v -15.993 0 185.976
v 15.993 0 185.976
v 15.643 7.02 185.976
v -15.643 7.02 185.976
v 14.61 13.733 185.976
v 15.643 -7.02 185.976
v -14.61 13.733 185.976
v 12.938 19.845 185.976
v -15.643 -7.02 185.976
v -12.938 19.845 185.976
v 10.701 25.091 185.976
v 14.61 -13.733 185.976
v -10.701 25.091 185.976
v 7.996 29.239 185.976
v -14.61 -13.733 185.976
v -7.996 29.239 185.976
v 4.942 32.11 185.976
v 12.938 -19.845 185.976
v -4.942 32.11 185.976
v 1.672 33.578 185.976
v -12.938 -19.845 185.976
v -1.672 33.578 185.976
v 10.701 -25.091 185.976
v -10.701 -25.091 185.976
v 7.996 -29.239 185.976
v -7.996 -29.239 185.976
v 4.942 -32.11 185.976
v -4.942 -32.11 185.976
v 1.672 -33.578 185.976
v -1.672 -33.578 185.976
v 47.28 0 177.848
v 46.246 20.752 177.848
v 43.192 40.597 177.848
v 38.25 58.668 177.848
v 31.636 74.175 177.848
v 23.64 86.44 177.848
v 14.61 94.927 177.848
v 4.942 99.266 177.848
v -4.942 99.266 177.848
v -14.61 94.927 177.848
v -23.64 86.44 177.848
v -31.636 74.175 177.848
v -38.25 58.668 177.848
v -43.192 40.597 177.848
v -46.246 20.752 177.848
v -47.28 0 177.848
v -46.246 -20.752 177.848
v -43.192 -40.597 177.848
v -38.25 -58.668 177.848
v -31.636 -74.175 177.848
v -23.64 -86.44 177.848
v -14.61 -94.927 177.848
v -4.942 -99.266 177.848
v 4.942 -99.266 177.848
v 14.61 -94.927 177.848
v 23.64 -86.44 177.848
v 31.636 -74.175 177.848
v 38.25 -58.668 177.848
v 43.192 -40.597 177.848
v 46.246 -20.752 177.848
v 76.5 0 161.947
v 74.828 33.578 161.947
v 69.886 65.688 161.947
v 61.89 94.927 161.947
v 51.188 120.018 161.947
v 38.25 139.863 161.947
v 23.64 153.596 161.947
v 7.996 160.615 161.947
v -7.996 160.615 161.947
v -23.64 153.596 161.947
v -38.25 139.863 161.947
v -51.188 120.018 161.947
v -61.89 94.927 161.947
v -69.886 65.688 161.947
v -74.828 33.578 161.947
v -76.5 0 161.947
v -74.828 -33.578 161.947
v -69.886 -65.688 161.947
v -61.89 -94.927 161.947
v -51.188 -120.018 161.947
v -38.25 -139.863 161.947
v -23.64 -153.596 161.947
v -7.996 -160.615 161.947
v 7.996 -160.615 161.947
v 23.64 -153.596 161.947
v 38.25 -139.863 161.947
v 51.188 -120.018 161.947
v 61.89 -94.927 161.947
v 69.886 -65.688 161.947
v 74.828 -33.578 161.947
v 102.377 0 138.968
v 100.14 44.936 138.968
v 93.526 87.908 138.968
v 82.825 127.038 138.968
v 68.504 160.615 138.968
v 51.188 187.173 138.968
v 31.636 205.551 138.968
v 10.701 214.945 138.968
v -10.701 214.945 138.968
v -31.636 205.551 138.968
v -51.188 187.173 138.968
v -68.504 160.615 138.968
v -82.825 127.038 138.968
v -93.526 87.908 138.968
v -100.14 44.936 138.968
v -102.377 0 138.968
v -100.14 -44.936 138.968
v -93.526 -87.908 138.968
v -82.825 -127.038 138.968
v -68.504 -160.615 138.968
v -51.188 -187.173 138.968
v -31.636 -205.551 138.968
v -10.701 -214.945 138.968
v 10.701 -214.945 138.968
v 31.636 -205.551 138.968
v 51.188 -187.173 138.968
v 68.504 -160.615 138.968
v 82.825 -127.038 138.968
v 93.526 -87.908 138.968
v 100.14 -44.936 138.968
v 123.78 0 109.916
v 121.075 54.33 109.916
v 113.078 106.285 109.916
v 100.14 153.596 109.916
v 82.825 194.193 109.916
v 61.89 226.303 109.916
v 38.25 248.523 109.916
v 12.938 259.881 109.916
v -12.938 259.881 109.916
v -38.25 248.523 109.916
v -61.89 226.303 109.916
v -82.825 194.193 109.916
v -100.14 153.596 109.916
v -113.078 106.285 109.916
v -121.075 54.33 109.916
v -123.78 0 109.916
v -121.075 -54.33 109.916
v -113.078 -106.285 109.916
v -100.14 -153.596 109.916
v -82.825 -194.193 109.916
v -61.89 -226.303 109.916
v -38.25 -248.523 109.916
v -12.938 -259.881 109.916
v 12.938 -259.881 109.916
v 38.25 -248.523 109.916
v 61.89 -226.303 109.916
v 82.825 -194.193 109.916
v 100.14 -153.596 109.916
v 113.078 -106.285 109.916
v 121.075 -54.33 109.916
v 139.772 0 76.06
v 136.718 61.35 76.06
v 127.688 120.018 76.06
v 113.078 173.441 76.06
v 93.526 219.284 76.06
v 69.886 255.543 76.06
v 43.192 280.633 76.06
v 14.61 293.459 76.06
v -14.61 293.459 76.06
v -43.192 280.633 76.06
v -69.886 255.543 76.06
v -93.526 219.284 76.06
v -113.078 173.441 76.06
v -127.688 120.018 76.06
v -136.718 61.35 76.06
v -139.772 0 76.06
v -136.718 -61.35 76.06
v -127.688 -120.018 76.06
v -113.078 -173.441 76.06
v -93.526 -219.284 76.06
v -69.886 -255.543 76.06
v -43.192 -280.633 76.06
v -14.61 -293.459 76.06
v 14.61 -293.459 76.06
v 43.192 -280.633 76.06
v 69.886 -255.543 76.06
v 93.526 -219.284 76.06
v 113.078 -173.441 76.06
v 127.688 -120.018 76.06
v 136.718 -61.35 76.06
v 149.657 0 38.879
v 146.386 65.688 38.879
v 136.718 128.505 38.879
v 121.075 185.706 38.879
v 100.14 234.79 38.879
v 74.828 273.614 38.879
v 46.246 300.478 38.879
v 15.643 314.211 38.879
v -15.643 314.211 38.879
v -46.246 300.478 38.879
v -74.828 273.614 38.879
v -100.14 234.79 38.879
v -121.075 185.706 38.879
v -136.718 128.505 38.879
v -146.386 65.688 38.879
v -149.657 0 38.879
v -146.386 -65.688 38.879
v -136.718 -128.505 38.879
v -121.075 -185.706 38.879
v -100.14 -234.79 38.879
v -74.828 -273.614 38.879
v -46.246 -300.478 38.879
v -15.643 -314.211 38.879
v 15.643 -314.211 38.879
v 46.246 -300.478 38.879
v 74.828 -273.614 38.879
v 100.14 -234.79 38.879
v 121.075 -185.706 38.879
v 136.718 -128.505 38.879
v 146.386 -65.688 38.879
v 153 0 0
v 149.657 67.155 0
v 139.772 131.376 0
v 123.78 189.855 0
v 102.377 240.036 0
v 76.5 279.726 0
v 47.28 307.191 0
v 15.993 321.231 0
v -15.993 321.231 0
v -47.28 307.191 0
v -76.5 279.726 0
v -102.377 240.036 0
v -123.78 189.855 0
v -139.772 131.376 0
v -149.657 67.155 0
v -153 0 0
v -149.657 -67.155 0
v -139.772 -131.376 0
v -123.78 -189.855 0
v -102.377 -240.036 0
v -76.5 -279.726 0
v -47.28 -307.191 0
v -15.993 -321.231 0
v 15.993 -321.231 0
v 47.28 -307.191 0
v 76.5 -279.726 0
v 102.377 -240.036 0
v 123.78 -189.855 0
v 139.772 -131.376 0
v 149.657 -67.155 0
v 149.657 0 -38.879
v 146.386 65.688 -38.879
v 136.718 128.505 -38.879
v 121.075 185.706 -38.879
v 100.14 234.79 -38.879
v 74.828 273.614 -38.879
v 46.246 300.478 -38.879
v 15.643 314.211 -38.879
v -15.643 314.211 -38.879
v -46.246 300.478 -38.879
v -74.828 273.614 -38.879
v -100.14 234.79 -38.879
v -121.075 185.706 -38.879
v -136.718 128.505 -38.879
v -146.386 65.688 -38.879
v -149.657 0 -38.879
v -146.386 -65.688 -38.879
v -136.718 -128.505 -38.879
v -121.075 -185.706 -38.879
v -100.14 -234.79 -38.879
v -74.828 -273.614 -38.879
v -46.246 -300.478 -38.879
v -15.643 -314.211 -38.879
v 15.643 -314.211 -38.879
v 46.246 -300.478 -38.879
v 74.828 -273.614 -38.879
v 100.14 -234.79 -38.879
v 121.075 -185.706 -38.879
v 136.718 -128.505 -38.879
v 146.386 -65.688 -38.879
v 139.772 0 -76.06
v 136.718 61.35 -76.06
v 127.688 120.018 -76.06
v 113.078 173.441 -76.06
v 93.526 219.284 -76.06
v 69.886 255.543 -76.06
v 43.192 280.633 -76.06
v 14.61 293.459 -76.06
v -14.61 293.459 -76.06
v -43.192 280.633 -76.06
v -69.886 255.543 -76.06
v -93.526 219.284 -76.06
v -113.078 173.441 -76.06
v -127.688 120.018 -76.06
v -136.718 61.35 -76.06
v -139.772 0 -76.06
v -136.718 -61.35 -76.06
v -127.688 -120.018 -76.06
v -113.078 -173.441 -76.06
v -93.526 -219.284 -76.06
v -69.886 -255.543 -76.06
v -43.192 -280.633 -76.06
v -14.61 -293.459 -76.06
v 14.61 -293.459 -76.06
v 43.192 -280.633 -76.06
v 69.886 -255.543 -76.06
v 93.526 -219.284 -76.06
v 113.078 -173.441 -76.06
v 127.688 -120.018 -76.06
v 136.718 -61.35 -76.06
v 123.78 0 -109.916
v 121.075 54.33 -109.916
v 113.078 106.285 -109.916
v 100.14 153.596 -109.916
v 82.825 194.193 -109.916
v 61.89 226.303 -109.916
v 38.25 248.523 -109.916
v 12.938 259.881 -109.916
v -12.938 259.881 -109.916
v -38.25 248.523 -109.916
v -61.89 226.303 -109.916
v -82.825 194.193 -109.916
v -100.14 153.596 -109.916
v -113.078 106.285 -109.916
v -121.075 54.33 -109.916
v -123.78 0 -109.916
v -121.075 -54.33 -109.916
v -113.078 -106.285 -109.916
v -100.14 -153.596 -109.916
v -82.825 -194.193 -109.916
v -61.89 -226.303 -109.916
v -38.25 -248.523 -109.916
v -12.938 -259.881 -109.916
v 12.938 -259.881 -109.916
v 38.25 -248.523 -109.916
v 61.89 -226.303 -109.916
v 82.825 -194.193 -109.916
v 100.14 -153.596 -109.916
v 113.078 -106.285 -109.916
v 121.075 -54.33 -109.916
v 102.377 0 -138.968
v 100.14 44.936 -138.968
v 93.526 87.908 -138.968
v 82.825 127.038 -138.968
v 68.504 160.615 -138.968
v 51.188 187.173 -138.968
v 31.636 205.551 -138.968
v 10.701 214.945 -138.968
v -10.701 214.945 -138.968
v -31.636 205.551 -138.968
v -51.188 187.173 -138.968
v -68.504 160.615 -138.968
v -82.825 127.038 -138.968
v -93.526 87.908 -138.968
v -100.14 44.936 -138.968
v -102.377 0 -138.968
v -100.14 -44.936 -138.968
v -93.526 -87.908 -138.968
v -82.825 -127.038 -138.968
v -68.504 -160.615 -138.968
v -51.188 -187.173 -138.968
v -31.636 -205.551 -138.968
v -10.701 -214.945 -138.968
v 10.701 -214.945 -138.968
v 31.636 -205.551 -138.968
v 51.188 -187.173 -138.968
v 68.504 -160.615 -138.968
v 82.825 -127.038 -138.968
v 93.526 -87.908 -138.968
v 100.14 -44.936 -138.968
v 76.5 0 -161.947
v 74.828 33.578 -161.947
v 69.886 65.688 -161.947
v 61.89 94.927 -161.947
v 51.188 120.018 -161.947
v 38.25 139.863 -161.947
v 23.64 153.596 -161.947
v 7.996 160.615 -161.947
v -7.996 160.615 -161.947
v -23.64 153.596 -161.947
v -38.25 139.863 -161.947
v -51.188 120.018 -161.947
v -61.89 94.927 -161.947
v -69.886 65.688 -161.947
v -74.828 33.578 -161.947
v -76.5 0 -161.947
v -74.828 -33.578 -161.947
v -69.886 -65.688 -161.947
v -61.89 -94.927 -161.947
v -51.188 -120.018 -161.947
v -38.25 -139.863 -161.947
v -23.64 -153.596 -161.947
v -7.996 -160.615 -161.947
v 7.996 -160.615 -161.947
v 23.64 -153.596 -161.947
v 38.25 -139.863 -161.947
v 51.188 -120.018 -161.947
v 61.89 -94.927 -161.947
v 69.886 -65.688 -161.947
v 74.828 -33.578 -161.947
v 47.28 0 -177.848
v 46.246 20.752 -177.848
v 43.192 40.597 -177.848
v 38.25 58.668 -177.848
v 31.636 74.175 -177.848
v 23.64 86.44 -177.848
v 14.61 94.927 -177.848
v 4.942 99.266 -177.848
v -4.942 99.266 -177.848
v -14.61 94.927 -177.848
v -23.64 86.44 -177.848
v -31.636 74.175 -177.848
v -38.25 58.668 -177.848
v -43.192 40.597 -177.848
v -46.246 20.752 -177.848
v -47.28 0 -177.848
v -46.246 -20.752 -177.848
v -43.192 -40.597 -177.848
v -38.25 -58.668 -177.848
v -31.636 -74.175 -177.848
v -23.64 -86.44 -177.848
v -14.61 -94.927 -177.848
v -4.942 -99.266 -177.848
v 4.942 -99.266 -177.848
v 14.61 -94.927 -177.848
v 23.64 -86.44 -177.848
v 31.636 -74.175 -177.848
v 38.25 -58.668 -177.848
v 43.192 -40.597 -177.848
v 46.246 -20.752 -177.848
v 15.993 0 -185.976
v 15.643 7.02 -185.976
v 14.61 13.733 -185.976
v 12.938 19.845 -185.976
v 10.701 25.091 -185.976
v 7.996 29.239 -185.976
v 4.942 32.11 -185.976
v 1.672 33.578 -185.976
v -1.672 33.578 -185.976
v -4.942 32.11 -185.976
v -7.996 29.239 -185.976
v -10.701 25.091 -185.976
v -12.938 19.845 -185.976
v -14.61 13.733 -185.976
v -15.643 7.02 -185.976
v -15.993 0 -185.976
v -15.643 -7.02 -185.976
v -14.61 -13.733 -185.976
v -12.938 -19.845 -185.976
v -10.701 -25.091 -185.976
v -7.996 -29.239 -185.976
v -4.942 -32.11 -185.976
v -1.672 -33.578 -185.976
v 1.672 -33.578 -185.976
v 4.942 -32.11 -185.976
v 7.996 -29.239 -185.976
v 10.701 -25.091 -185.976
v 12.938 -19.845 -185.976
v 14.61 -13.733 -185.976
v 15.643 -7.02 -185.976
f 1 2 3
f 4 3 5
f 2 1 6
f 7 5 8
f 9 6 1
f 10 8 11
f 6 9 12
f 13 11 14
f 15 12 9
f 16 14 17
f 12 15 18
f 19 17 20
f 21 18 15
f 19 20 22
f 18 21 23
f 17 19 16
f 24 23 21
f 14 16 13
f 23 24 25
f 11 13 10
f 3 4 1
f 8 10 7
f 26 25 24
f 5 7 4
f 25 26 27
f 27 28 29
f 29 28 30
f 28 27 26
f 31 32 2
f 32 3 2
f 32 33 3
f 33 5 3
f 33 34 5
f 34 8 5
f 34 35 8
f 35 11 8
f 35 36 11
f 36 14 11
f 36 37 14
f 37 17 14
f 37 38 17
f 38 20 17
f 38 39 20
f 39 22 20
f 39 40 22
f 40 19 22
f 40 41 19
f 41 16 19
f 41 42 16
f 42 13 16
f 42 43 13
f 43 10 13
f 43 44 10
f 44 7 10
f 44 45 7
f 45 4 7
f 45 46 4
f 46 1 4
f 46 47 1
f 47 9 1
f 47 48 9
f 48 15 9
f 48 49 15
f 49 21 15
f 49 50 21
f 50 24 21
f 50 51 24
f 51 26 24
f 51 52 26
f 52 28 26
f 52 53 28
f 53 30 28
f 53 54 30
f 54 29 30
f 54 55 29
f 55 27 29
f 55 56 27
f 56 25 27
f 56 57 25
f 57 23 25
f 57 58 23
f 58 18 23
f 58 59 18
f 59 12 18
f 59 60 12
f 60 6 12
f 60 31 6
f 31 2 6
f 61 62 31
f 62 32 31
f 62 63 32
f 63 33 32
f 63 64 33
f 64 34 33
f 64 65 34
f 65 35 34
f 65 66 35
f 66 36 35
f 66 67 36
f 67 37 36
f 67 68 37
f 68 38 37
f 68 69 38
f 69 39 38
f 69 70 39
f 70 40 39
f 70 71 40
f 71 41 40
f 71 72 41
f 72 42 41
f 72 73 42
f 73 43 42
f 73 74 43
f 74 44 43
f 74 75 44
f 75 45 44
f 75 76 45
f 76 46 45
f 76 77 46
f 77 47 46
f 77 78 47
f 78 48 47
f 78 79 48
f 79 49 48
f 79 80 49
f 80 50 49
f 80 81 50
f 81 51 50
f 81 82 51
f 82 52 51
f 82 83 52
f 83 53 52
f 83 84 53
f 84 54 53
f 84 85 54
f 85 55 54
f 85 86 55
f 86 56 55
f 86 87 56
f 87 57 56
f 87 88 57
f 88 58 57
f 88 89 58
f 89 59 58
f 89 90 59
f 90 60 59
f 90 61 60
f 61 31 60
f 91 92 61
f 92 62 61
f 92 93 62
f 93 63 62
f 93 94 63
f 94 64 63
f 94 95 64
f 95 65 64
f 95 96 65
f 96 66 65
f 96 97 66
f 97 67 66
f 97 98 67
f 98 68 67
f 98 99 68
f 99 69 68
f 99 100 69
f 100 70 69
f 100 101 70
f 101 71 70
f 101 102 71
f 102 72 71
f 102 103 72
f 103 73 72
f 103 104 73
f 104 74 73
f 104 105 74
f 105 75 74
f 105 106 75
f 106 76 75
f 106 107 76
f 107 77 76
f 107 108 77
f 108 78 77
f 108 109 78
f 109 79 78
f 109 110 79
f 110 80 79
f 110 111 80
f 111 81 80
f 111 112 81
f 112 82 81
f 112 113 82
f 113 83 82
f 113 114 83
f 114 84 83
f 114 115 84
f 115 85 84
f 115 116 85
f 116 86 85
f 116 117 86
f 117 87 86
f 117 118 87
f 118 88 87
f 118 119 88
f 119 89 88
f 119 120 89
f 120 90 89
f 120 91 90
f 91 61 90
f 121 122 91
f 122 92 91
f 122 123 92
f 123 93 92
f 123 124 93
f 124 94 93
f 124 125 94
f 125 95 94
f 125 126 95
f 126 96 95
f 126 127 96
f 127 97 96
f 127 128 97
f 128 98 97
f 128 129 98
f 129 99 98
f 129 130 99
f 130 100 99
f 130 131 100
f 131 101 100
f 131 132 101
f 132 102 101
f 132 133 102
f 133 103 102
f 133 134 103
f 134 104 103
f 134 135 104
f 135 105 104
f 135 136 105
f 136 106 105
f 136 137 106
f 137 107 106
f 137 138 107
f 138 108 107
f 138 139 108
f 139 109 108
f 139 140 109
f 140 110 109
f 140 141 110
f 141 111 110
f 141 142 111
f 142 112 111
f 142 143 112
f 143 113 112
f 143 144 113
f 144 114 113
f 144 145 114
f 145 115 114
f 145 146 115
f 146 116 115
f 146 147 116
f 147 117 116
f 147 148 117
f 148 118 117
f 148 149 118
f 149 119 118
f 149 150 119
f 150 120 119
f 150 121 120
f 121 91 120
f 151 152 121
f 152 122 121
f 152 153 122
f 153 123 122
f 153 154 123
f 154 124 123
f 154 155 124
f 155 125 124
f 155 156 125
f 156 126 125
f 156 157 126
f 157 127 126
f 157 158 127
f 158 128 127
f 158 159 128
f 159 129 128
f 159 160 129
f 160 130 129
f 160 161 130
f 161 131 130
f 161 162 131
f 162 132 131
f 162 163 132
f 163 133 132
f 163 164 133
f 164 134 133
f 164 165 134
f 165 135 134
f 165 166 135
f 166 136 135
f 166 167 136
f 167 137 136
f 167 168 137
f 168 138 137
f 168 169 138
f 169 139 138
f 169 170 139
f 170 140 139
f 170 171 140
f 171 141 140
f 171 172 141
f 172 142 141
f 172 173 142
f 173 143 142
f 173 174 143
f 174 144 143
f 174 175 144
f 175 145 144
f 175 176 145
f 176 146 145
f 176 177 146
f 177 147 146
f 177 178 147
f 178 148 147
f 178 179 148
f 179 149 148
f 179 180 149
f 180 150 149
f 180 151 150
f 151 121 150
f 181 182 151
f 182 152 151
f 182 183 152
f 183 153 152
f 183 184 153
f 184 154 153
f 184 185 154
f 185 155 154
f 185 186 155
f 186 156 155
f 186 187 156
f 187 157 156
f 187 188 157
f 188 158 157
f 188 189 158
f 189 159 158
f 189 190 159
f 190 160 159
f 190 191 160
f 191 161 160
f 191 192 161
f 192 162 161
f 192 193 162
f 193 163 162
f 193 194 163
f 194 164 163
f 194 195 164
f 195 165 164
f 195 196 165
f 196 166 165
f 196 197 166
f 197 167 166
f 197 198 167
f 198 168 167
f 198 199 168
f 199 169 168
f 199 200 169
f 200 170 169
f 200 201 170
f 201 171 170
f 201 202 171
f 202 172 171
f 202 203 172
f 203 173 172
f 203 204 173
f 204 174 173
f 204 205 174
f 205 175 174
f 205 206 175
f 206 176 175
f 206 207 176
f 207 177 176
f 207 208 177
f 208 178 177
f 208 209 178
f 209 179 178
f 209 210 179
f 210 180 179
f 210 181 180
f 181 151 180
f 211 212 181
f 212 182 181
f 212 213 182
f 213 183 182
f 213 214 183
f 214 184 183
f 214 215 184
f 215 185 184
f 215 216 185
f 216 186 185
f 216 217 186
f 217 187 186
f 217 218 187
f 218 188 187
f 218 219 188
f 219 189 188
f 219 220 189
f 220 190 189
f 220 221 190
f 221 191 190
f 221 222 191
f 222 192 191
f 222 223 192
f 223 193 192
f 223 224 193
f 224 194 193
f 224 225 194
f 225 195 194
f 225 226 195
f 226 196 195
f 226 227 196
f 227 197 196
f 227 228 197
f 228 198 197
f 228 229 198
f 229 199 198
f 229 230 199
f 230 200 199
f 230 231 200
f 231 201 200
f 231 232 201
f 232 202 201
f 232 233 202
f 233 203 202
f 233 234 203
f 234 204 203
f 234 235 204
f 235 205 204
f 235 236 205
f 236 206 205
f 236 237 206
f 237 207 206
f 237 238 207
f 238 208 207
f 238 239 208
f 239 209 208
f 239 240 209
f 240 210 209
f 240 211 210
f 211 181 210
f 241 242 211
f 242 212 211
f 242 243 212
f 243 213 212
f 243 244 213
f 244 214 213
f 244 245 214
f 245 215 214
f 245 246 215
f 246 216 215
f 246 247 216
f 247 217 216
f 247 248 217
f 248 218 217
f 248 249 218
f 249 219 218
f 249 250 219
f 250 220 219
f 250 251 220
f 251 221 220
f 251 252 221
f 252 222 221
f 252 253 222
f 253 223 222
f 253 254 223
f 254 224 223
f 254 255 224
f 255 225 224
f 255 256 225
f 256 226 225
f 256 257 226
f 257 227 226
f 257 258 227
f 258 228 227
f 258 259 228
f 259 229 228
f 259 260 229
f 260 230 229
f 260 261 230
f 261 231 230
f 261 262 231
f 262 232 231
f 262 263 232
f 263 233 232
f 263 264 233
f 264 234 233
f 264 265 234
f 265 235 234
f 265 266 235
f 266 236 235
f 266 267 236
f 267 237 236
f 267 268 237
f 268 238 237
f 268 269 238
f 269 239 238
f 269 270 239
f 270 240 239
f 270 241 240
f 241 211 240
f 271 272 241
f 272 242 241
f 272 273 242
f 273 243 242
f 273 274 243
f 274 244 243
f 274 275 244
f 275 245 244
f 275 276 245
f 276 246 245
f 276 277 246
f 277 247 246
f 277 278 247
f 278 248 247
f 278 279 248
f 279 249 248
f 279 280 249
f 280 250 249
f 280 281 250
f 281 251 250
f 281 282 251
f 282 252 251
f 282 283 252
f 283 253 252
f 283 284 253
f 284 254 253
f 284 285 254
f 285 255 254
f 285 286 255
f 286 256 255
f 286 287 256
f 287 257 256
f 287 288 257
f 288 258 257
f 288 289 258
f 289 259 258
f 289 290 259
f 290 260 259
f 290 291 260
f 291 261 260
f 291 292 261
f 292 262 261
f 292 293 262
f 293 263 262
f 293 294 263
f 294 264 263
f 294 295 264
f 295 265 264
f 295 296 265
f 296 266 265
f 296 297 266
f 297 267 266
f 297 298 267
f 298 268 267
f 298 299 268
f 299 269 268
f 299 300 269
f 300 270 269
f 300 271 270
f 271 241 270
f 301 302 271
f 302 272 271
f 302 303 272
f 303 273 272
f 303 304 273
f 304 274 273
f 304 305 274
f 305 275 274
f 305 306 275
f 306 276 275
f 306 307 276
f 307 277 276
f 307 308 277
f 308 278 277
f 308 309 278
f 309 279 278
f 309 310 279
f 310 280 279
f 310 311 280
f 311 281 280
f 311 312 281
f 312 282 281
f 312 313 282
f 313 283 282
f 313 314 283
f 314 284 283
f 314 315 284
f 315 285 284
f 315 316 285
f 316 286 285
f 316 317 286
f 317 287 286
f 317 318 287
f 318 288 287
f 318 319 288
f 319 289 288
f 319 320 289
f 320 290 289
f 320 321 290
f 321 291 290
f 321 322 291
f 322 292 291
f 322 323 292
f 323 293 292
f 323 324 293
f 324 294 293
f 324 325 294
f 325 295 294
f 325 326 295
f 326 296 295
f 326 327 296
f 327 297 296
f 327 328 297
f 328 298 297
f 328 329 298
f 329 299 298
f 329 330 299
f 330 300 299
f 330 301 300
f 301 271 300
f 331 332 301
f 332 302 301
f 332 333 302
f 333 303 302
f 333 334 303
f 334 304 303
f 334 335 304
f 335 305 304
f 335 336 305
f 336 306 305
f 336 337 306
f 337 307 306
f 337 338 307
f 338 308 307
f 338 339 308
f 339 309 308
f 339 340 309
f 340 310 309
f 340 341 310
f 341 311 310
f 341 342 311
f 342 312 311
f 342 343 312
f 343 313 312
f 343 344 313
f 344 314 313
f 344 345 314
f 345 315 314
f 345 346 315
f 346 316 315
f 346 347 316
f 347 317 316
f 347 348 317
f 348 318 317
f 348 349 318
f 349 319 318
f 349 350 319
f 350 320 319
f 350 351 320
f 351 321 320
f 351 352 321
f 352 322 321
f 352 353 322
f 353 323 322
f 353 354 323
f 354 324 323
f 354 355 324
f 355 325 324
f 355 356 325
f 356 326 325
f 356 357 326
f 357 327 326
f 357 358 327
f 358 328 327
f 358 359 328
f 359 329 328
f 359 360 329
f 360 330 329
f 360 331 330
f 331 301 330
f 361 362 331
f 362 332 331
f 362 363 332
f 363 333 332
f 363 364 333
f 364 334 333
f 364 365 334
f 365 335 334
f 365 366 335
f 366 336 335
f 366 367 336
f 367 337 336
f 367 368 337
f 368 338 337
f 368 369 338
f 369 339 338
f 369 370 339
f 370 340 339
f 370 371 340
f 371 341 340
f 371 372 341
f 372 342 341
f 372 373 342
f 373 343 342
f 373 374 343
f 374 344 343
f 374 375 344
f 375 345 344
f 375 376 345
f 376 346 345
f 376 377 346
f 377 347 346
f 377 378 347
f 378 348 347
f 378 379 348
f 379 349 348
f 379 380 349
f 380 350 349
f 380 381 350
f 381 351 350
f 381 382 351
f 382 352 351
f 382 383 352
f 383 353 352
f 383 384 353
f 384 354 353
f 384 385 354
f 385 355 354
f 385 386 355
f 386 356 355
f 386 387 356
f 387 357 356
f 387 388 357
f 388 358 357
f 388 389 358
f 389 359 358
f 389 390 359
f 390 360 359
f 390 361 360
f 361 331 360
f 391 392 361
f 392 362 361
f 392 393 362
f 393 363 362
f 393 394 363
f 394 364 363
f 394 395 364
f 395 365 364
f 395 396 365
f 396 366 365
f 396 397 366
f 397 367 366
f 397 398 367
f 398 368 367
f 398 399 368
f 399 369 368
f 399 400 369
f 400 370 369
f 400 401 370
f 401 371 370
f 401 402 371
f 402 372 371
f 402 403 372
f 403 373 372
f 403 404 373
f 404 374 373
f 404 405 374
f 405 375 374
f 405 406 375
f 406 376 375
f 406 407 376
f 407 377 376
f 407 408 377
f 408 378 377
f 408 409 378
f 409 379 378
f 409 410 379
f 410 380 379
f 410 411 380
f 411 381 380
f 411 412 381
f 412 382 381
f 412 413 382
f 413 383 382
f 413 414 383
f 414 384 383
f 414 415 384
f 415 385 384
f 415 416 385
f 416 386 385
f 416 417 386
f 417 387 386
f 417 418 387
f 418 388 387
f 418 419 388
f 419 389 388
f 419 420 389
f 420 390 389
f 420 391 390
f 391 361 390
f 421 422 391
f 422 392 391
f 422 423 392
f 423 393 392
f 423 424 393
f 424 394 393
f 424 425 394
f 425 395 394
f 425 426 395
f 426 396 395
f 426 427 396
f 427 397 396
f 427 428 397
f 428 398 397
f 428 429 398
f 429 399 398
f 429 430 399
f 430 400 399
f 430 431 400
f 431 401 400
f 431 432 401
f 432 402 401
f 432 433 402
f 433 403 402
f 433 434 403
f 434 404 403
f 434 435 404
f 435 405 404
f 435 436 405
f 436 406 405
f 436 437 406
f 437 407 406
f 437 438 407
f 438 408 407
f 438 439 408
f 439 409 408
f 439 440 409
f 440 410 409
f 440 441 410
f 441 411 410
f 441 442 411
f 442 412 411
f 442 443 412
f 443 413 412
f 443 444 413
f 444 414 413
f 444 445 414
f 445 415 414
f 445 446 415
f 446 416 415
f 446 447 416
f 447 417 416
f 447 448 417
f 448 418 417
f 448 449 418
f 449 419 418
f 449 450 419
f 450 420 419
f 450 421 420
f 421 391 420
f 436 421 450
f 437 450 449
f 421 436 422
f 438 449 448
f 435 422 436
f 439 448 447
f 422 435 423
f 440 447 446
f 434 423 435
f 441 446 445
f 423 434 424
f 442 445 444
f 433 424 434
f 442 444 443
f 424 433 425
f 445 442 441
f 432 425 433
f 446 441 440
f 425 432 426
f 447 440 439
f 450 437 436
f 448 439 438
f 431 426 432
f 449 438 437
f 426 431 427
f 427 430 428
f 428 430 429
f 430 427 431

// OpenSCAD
// Generated by SolidPython 1.0.1 on 2020-07-29 00:46:49


scale(v = [9, 19, 11]) {
	sphere(r = 17);
}
/***********************************************
*********      SolidPython code:      **********
************************************************
 
# import packages: SolidPython
from solid import *
from solid.utils import *
from itertools import chain, combinations, permutations


class Resize:

    def __init__(self, scad_file):
        self.scad_file = scad_file
        #self.scad_file = import_scad(scad_file)
        # cone/cylinder param:
        self.r1 = 0
        self.r2 = 0
        self.h = 0
        # rectangular prism param:
        self.w = 0
        self.l = 0
        # ellipse param:
        self.r = 0

    # import OpenScad code (file name corresponds to shape)


    # classify shape + parameters
    def assign(self, param1, param2, param3):
        if self.scad_file == 'cone.scad':
            self.r1 = param1
            self.r2 = param2
            self.h = param3
        elif self.scad_file == 'cylinder.scad':
            self.r1 = param1
            self.r2 = param2
            self.h = param3
        elif self.scad_file == 'rectangularPrism.scad':
            self.h = param1
            self.l = param2
            self.w = param3
        else:
            self.r = param1
            self.h = param2

    # resize parameters
    def iterate(self):
        x = range(3, 20, 2)
        i = 1
        if self.scad_file == 'cone.scad':
            tempList = list(permutations(x, 2))
            for temp in tempList:
                param1 = temp[0]
                param2 = temp[1]
                filepath = 'produced_scad_files/' + 'cone' + str(param1) + '_' + str(param2) + '_' + '.scad'
                scad_render_to_file(cylinder(h=param1, r1=param2, r2=0), filepath)

        elif self.scad_file == 'cylinder.scad':
            tempList = list(permutations(x, 3))
            for temp in tempList:
                param1 = temp[0]
                param2 = temp[1]
                filepath = 'produced_scad_files/' + 'cylinder' + str(param1) + '_' + str(param2) + '_' + '.scad'
                scad_render_to_file(cylinder(h=param1, r1=param2, r2=param2), filepath)

        elif self.scad_file == 'rectangularPrism.scad':
            tempList = list(permutations(x, 3))
            for temp in tempList:
                param1 = temp[0]
                param2 = temp[1]
                param3 = temp[2]
                filepath = 'produced_scad_files/' + 'rectangularPrism' + str(param1) + '_' + str(param2) + '_' + str(
                    param3) + '.scad'
                scad_render_to_file(cube(size=(param1, param2, param3)), filepath)

        elif self.scad_file == 'ellipse.scad':
            tempList = list(permutations(x, 4))
            for temp in tempList:
                param1 = temp[0]
                param2 = temp[1]
                param3 = temp[2]
                param4 = temp[3]
                filepath = 'produced_scad_files/' + 'ellipse' + str(param1) + '_' + str(param2) + '_' + str(param3) + '_' + str(param4) + '.scad'
                scad_render_to_file(scale([param1, param2, param3])(sphere(r=param4)), filepath)

    def render_to_scadfile(self):
        scad_render_to_file(scad, 'example.scad') 
 
************************************************/
